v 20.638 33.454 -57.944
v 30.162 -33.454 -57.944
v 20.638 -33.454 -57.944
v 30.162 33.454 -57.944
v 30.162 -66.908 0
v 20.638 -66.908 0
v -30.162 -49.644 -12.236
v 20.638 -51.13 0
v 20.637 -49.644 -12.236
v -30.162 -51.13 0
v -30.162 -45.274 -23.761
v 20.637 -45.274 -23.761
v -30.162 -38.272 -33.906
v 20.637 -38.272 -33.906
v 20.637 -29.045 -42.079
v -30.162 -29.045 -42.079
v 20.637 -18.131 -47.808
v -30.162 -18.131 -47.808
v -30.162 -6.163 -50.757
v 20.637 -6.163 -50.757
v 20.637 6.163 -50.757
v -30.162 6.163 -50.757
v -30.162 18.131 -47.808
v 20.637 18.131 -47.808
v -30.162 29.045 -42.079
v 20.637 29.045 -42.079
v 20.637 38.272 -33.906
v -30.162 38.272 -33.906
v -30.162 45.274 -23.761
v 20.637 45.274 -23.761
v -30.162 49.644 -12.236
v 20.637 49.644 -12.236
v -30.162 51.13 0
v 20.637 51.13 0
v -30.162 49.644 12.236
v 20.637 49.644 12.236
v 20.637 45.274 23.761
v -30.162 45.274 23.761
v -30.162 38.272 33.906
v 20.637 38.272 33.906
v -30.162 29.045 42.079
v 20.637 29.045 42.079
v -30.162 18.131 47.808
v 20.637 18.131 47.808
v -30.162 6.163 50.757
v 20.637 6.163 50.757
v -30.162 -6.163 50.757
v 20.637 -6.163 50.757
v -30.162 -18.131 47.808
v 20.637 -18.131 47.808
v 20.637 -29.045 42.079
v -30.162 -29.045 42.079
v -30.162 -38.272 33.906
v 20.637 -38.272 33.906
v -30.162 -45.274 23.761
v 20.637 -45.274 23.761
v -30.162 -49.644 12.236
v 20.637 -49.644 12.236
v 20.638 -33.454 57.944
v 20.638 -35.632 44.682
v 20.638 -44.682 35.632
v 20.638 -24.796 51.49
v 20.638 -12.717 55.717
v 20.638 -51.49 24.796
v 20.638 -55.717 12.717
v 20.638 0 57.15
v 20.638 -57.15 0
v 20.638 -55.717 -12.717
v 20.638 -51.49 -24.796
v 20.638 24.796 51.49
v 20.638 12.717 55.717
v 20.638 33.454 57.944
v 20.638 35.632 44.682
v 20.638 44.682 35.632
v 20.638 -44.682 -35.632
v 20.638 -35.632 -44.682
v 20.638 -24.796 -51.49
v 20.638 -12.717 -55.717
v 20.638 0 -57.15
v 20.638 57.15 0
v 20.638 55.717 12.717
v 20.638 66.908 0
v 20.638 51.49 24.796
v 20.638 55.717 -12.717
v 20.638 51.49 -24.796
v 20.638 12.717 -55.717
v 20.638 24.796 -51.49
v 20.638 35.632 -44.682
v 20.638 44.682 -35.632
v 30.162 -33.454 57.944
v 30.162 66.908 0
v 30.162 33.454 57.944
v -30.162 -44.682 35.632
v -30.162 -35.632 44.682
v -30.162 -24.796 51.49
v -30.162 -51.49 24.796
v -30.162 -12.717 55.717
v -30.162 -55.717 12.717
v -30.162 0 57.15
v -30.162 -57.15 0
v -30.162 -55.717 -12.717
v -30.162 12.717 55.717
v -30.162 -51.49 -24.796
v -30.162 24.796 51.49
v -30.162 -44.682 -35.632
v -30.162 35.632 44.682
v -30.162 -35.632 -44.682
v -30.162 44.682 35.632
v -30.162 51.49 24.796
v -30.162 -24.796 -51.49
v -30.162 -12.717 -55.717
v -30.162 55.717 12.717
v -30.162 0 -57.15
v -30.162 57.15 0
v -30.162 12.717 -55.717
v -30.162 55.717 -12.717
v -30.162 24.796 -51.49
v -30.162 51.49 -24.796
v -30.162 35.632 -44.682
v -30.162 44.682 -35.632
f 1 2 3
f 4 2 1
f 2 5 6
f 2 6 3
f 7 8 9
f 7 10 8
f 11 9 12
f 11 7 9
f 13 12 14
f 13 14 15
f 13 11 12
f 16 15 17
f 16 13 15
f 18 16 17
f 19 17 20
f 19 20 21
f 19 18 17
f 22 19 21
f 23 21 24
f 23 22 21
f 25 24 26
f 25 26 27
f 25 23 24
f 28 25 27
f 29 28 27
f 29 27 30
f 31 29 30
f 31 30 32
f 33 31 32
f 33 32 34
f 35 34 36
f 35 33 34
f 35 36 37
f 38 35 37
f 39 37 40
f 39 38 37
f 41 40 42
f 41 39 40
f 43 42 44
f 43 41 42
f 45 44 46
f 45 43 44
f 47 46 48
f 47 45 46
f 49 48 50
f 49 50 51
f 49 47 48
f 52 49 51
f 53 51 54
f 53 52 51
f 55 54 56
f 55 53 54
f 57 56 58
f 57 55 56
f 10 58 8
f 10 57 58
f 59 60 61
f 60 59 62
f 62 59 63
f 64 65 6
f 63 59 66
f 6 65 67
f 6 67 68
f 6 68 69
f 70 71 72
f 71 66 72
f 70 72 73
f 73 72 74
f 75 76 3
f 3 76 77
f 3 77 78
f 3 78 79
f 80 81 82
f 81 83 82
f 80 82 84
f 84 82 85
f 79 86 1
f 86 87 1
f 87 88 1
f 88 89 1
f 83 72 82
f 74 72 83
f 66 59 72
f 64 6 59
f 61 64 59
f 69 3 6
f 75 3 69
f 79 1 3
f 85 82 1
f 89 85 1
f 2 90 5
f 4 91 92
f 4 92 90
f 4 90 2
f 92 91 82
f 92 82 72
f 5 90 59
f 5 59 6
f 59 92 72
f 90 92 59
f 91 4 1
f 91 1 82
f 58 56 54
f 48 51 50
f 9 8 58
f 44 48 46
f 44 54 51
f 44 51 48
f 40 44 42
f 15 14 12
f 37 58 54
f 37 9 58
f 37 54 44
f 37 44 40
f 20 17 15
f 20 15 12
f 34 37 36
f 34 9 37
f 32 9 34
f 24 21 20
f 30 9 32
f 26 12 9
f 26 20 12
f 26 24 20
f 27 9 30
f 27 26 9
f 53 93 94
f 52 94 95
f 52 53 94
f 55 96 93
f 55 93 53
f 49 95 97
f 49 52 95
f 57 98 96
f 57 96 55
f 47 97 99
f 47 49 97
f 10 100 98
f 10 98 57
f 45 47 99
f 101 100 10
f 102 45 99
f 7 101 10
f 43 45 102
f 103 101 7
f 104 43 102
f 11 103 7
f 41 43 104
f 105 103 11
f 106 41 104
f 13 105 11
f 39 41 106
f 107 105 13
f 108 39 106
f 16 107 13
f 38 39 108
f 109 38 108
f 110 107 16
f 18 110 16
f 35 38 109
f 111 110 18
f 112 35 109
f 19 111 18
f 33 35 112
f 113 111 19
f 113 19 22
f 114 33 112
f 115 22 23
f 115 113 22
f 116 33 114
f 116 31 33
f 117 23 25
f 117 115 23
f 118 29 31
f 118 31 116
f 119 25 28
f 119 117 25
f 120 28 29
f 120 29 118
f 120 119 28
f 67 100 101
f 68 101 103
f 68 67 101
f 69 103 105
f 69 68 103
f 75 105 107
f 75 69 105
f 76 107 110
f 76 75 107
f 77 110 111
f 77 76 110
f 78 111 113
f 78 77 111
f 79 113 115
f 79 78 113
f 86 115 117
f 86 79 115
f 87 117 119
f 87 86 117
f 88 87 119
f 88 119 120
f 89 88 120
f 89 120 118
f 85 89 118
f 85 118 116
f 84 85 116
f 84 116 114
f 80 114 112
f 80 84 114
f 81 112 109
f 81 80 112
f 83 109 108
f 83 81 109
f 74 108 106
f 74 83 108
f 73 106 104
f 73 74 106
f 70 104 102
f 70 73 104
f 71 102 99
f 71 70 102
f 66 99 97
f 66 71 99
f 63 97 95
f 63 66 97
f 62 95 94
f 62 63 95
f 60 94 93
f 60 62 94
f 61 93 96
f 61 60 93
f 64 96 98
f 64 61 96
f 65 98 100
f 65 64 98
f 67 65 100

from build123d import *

# Parameters (mm, degrees)
SKETCH2_R           = 57.15
BOSS_EXTRUDE1_DEPTH = 9.525


with BuildPart() as part:
    # Sketch1 → Revolve1 (revolve)
    with BuildSketch(Plane.XY):
        Polygon((-30.1625, -57.15), (30.1625, -57.15), (30.1625, 0), (20.6375, 0), (20.6375, -51.1302), (-30.1625, -51.1302), align=None)
    revolve(axis=Axis((-30.1625, 0, 0), (1, 0, 0)))

    # Sketch2 → Boss-Extrude1 (add)
    with BuildSketch(Plane(origin=(30.1625, 0, 0), x_dir=(0, 0, -1), z_dir=(1, 0, 0))):
        Polygon((0, 66.907679321), (-57.94375, 33.45383966), (-57.94375, -33.45383966), (0, -66.907679321), (57.94375, -33.45383966), (57.94375, 33.45383966), align=None)
        Circle(SKETCH2_R, mode=Mode.SUBTRACT)
    extrude(amount=-BOSS_EXTRUDE1_DEPTH)


solid = part.part
